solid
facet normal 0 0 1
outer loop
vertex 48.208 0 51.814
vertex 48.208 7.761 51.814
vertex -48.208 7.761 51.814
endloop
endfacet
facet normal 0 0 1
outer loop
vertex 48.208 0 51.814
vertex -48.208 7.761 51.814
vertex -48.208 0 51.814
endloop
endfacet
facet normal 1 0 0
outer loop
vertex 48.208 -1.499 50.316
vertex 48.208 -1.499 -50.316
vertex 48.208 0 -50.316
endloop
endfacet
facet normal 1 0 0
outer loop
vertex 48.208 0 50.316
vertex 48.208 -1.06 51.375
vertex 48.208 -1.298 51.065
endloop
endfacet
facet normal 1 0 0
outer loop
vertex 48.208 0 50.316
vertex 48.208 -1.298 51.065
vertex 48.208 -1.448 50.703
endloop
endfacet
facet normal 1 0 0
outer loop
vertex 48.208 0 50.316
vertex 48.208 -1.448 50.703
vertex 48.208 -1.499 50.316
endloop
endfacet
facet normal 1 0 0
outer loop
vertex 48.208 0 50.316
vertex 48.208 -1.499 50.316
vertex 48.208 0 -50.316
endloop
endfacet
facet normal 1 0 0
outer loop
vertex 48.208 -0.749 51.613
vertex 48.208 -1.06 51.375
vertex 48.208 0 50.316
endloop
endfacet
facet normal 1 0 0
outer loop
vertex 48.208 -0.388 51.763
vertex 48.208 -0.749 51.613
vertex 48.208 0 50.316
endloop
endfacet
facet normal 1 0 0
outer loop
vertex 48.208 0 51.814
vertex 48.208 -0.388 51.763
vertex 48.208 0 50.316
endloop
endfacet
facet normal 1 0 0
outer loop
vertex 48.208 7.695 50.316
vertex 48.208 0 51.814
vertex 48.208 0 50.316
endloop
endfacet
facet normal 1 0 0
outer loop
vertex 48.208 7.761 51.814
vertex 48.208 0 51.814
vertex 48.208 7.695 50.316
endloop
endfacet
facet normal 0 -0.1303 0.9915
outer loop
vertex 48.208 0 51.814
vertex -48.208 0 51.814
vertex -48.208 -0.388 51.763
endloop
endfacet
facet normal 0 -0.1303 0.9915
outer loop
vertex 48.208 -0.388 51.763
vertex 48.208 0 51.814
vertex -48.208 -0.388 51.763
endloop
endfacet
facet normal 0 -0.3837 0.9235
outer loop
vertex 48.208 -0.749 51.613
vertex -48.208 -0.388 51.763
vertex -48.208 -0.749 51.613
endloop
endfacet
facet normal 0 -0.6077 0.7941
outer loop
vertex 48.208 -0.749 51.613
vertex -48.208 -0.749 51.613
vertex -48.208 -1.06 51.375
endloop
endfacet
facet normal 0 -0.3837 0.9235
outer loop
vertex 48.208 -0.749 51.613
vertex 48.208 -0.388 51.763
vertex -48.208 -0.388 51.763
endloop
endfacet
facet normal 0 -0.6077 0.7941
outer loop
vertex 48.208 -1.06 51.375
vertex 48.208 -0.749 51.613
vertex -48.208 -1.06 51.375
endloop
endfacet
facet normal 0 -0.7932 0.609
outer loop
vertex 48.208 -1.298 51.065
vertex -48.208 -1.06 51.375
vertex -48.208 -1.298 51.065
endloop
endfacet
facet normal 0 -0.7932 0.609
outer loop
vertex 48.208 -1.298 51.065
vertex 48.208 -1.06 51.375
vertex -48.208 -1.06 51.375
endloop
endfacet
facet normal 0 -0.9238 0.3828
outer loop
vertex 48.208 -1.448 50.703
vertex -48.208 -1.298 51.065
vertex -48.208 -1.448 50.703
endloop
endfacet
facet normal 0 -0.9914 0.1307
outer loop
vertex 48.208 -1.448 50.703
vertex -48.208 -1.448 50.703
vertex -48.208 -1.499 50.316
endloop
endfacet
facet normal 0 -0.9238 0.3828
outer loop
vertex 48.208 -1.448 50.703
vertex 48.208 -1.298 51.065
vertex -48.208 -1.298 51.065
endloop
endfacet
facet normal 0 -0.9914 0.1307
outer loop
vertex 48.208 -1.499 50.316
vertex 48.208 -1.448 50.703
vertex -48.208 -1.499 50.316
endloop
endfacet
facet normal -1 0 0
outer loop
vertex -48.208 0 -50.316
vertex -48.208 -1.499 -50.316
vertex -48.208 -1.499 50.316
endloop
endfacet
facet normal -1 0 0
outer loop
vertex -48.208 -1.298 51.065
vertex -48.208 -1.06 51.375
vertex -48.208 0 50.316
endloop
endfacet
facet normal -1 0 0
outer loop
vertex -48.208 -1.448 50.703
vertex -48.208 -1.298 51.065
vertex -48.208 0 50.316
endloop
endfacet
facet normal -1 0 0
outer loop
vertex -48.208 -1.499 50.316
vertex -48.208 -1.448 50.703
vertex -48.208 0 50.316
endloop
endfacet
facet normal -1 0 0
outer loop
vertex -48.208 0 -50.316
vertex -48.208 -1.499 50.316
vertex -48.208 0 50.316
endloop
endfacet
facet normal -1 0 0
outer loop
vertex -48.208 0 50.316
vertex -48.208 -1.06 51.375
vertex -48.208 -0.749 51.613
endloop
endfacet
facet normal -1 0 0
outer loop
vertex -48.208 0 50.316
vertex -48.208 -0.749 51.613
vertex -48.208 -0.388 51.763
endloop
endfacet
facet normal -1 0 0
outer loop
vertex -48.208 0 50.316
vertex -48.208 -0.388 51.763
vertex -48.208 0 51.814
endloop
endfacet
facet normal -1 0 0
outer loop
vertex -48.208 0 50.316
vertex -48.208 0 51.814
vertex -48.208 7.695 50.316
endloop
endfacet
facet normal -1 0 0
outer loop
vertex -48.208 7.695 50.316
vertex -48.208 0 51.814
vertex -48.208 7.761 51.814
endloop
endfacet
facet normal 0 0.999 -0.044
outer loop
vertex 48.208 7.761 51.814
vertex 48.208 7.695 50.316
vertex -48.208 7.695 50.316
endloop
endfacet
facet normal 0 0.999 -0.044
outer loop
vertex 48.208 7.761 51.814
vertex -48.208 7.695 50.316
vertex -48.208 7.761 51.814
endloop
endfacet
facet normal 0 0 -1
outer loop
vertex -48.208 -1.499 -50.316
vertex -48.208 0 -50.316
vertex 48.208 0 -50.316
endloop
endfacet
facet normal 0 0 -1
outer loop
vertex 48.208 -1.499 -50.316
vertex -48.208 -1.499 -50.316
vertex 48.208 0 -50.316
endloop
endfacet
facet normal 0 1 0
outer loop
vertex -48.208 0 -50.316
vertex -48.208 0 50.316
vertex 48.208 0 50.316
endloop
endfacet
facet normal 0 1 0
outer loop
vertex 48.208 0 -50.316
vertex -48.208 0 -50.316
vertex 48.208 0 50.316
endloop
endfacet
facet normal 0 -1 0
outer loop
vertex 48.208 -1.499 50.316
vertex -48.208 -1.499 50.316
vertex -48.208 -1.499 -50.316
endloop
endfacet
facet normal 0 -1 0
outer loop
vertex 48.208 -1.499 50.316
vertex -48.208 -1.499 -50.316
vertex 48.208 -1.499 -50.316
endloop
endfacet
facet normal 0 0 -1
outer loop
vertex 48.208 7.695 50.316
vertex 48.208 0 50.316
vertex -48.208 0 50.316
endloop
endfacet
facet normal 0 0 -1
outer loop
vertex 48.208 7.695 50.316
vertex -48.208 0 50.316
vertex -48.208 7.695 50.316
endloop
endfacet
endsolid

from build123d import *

# Parameters (mm, degrees)
F0_W     = 96.4152663946
F0_H     = 100.6311327219
F1_DEPTH = 1.4986
F3_DEPTH = 96.4152663946


with BuildPart() as f1:
    # F0 (on Front) → F1 (new body)
    with BuildSketch(Plane.XZ):
        Rectangle(F0_W, F0_H)
    extrude(amount=F1_DEPTH)

    # F2 (on face) → F3 (join, through all)
    with BuildSketch(Plane.YZ.offset(48.2076331973)):
        with BuildLine():
            Line((7.7614295296, 51.814166361), (0, 51.814166361))
            ThreePointArc((0, 51.814166361), (-1.0596702223, 51.3752365832), (-1.4986, 50.315566361))
            Line((-1.4986, 50.315566361), (0, 50.315566361))
            Line((0, 50.315566361), (7.6948883943, 50.315566361))
            Line((7.6948883943, 50.315566361), (7.7614295296, 51.814166361))
        make_face()
    extrude(amount=-F3_DEPTH)


solid = f1.part
